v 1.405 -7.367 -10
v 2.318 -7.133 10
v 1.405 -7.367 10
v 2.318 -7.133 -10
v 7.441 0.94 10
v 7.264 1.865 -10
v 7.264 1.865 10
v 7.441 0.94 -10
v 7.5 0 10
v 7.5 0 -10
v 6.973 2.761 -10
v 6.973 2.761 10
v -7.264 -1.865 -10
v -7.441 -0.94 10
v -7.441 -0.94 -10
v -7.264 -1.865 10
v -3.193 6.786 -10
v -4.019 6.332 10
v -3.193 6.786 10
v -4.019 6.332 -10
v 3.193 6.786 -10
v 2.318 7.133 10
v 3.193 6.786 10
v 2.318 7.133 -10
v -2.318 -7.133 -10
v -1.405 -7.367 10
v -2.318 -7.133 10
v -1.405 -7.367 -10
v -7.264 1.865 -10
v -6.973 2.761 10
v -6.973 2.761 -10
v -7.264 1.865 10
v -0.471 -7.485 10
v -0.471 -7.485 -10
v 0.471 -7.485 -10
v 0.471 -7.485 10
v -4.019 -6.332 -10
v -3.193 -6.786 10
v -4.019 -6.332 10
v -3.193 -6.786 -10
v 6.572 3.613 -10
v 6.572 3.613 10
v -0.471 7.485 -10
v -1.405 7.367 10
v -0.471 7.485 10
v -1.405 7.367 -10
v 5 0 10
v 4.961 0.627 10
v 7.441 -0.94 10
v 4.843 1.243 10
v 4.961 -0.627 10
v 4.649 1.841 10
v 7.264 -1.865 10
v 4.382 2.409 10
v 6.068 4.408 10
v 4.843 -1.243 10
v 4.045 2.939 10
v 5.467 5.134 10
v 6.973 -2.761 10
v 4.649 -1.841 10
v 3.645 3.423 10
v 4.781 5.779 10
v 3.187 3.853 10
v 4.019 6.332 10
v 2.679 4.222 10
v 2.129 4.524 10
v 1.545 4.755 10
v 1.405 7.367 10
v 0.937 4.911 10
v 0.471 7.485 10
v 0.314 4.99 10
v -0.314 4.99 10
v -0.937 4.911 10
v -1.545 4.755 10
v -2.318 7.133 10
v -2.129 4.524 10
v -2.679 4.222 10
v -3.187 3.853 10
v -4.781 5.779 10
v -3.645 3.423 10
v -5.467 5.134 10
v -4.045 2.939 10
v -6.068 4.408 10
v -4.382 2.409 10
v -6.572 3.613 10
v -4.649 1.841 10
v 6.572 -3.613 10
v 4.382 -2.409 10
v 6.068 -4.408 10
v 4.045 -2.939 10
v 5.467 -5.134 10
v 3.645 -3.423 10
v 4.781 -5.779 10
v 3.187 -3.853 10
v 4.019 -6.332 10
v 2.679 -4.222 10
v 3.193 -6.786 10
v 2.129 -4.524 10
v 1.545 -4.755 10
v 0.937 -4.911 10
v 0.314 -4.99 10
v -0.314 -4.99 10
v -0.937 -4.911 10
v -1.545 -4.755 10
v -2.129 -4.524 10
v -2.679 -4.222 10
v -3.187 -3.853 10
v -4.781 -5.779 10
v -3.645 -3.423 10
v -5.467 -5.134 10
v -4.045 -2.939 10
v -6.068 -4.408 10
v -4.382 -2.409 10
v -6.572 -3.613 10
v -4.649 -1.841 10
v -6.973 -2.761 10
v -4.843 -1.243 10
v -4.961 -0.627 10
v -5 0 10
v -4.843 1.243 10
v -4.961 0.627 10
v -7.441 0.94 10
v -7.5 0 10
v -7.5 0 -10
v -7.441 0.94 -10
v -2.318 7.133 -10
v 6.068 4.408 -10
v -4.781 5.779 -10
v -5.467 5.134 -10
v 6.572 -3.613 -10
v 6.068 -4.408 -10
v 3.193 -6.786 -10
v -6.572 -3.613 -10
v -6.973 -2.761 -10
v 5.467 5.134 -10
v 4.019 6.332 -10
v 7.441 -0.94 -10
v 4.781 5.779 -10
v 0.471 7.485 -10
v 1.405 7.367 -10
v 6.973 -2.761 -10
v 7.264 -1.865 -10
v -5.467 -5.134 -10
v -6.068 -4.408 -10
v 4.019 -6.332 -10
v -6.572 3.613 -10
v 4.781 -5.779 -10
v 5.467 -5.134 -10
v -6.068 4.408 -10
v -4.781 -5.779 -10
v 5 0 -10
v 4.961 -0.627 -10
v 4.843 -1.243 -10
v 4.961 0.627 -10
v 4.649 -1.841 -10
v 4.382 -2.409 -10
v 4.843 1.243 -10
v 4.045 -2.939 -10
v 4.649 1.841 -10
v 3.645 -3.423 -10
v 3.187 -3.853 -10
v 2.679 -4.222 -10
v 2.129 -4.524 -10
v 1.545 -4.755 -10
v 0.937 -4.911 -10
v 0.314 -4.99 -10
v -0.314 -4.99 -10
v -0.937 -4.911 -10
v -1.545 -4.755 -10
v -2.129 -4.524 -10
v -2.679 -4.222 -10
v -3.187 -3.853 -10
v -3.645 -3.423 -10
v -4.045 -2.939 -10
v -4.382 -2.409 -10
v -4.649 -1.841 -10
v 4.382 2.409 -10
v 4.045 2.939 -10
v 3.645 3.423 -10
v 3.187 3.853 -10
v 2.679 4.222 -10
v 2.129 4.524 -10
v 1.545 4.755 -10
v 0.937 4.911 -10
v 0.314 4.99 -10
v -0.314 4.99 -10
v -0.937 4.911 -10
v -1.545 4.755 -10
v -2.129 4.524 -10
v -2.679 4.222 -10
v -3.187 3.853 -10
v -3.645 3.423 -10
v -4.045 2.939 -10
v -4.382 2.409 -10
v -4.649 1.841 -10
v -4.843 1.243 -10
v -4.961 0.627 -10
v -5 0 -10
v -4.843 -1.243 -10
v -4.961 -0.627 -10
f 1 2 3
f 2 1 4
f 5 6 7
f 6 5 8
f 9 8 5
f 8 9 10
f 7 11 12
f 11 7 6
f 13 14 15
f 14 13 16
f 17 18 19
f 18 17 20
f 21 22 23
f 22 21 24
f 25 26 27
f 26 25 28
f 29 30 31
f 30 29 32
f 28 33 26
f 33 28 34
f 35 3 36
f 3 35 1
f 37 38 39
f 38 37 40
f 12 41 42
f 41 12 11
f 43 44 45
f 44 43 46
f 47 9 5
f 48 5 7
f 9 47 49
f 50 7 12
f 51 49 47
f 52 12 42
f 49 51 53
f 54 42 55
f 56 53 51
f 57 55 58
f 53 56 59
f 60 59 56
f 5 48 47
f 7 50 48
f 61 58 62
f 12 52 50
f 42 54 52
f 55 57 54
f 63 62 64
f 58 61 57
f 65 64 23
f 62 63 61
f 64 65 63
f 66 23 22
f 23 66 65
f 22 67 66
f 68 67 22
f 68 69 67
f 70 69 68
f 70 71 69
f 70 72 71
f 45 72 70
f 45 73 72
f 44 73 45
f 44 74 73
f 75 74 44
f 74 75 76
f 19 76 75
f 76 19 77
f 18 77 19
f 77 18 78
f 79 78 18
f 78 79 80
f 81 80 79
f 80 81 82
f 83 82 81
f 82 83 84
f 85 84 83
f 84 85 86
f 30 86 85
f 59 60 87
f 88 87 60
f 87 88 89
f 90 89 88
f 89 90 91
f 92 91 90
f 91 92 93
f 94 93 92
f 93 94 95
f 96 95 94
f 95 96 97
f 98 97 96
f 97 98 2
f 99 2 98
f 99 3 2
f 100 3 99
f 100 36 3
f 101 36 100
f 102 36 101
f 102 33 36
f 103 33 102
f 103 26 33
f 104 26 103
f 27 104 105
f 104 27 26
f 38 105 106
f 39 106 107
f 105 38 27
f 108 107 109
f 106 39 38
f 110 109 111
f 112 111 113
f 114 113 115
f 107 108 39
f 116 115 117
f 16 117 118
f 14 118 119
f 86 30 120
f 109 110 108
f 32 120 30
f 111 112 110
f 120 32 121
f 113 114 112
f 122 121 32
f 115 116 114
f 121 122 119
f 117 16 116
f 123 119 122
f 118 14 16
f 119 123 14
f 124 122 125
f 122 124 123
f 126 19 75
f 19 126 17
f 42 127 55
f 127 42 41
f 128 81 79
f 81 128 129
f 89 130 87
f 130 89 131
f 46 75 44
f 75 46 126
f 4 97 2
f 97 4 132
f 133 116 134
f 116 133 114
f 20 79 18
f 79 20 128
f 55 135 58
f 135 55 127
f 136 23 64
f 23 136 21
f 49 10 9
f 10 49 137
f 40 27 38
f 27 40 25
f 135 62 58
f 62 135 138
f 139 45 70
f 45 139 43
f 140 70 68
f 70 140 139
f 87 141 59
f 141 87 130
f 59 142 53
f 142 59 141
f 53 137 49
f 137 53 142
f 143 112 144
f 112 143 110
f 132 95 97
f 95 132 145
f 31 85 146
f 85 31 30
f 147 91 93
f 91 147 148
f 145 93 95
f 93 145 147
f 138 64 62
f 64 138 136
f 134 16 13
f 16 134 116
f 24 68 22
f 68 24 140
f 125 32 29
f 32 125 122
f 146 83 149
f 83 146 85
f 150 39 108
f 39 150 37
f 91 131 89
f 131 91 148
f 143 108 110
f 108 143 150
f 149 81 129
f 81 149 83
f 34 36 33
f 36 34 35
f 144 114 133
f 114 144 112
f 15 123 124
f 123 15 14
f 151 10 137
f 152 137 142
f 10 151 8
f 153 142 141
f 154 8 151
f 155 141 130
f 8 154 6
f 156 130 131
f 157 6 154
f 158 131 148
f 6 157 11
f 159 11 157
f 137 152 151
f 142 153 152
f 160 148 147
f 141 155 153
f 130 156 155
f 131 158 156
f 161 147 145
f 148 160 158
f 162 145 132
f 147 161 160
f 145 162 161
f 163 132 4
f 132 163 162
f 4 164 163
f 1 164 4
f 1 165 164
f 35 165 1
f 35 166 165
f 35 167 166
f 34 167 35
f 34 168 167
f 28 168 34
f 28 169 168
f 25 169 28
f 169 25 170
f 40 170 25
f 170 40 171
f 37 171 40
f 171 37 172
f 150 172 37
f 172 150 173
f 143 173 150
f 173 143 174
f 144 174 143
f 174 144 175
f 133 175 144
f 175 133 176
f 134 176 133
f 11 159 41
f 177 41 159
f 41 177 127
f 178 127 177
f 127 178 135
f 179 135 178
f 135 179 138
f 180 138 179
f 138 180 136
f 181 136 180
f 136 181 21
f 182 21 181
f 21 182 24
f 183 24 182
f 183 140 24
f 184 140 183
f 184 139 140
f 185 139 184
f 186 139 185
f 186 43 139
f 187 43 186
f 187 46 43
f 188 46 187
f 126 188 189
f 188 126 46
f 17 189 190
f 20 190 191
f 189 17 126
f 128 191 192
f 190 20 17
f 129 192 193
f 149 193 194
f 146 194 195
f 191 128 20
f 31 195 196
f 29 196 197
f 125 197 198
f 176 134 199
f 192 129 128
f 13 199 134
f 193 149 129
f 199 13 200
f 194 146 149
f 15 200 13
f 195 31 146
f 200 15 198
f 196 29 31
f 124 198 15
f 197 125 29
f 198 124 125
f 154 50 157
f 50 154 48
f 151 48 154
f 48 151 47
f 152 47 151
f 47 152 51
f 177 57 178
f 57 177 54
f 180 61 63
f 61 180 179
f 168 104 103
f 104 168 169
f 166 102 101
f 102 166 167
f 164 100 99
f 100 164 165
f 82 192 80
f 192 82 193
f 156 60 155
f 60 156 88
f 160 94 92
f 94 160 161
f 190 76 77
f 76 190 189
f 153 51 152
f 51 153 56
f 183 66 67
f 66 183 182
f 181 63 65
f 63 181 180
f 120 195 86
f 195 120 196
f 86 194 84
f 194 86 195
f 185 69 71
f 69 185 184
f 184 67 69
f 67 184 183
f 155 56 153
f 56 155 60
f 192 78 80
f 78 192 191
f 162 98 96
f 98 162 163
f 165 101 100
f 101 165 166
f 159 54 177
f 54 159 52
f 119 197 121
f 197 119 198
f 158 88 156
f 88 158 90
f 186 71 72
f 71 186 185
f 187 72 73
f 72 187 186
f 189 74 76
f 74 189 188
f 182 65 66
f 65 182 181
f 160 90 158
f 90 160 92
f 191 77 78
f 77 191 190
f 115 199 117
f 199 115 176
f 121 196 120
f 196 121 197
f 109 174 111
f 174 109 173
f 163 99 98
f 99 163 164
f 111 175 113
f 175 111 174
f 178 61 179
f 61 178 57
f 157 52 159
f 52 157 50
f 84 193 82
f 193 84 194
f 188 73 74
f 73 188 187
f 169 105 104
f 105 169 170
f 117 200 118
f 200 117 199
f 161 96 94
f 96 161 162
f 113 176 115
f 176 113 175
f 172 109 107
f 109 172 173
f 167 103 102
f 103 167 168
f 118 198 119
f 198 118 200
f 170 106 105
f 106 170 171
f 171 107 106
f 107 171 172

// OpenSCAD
$fn = 50;


difference() {
	union() {
		translate(v = [0, 0, -10.0000000000]) {
			cylinder(h = 20, r = 7.5000000000);
		}
	}
	union() {
		translate(v = [0, 0, -100.0000000000]) {
			cylinder(h = 200, r = 5.0000000000);
		}
	}
}
